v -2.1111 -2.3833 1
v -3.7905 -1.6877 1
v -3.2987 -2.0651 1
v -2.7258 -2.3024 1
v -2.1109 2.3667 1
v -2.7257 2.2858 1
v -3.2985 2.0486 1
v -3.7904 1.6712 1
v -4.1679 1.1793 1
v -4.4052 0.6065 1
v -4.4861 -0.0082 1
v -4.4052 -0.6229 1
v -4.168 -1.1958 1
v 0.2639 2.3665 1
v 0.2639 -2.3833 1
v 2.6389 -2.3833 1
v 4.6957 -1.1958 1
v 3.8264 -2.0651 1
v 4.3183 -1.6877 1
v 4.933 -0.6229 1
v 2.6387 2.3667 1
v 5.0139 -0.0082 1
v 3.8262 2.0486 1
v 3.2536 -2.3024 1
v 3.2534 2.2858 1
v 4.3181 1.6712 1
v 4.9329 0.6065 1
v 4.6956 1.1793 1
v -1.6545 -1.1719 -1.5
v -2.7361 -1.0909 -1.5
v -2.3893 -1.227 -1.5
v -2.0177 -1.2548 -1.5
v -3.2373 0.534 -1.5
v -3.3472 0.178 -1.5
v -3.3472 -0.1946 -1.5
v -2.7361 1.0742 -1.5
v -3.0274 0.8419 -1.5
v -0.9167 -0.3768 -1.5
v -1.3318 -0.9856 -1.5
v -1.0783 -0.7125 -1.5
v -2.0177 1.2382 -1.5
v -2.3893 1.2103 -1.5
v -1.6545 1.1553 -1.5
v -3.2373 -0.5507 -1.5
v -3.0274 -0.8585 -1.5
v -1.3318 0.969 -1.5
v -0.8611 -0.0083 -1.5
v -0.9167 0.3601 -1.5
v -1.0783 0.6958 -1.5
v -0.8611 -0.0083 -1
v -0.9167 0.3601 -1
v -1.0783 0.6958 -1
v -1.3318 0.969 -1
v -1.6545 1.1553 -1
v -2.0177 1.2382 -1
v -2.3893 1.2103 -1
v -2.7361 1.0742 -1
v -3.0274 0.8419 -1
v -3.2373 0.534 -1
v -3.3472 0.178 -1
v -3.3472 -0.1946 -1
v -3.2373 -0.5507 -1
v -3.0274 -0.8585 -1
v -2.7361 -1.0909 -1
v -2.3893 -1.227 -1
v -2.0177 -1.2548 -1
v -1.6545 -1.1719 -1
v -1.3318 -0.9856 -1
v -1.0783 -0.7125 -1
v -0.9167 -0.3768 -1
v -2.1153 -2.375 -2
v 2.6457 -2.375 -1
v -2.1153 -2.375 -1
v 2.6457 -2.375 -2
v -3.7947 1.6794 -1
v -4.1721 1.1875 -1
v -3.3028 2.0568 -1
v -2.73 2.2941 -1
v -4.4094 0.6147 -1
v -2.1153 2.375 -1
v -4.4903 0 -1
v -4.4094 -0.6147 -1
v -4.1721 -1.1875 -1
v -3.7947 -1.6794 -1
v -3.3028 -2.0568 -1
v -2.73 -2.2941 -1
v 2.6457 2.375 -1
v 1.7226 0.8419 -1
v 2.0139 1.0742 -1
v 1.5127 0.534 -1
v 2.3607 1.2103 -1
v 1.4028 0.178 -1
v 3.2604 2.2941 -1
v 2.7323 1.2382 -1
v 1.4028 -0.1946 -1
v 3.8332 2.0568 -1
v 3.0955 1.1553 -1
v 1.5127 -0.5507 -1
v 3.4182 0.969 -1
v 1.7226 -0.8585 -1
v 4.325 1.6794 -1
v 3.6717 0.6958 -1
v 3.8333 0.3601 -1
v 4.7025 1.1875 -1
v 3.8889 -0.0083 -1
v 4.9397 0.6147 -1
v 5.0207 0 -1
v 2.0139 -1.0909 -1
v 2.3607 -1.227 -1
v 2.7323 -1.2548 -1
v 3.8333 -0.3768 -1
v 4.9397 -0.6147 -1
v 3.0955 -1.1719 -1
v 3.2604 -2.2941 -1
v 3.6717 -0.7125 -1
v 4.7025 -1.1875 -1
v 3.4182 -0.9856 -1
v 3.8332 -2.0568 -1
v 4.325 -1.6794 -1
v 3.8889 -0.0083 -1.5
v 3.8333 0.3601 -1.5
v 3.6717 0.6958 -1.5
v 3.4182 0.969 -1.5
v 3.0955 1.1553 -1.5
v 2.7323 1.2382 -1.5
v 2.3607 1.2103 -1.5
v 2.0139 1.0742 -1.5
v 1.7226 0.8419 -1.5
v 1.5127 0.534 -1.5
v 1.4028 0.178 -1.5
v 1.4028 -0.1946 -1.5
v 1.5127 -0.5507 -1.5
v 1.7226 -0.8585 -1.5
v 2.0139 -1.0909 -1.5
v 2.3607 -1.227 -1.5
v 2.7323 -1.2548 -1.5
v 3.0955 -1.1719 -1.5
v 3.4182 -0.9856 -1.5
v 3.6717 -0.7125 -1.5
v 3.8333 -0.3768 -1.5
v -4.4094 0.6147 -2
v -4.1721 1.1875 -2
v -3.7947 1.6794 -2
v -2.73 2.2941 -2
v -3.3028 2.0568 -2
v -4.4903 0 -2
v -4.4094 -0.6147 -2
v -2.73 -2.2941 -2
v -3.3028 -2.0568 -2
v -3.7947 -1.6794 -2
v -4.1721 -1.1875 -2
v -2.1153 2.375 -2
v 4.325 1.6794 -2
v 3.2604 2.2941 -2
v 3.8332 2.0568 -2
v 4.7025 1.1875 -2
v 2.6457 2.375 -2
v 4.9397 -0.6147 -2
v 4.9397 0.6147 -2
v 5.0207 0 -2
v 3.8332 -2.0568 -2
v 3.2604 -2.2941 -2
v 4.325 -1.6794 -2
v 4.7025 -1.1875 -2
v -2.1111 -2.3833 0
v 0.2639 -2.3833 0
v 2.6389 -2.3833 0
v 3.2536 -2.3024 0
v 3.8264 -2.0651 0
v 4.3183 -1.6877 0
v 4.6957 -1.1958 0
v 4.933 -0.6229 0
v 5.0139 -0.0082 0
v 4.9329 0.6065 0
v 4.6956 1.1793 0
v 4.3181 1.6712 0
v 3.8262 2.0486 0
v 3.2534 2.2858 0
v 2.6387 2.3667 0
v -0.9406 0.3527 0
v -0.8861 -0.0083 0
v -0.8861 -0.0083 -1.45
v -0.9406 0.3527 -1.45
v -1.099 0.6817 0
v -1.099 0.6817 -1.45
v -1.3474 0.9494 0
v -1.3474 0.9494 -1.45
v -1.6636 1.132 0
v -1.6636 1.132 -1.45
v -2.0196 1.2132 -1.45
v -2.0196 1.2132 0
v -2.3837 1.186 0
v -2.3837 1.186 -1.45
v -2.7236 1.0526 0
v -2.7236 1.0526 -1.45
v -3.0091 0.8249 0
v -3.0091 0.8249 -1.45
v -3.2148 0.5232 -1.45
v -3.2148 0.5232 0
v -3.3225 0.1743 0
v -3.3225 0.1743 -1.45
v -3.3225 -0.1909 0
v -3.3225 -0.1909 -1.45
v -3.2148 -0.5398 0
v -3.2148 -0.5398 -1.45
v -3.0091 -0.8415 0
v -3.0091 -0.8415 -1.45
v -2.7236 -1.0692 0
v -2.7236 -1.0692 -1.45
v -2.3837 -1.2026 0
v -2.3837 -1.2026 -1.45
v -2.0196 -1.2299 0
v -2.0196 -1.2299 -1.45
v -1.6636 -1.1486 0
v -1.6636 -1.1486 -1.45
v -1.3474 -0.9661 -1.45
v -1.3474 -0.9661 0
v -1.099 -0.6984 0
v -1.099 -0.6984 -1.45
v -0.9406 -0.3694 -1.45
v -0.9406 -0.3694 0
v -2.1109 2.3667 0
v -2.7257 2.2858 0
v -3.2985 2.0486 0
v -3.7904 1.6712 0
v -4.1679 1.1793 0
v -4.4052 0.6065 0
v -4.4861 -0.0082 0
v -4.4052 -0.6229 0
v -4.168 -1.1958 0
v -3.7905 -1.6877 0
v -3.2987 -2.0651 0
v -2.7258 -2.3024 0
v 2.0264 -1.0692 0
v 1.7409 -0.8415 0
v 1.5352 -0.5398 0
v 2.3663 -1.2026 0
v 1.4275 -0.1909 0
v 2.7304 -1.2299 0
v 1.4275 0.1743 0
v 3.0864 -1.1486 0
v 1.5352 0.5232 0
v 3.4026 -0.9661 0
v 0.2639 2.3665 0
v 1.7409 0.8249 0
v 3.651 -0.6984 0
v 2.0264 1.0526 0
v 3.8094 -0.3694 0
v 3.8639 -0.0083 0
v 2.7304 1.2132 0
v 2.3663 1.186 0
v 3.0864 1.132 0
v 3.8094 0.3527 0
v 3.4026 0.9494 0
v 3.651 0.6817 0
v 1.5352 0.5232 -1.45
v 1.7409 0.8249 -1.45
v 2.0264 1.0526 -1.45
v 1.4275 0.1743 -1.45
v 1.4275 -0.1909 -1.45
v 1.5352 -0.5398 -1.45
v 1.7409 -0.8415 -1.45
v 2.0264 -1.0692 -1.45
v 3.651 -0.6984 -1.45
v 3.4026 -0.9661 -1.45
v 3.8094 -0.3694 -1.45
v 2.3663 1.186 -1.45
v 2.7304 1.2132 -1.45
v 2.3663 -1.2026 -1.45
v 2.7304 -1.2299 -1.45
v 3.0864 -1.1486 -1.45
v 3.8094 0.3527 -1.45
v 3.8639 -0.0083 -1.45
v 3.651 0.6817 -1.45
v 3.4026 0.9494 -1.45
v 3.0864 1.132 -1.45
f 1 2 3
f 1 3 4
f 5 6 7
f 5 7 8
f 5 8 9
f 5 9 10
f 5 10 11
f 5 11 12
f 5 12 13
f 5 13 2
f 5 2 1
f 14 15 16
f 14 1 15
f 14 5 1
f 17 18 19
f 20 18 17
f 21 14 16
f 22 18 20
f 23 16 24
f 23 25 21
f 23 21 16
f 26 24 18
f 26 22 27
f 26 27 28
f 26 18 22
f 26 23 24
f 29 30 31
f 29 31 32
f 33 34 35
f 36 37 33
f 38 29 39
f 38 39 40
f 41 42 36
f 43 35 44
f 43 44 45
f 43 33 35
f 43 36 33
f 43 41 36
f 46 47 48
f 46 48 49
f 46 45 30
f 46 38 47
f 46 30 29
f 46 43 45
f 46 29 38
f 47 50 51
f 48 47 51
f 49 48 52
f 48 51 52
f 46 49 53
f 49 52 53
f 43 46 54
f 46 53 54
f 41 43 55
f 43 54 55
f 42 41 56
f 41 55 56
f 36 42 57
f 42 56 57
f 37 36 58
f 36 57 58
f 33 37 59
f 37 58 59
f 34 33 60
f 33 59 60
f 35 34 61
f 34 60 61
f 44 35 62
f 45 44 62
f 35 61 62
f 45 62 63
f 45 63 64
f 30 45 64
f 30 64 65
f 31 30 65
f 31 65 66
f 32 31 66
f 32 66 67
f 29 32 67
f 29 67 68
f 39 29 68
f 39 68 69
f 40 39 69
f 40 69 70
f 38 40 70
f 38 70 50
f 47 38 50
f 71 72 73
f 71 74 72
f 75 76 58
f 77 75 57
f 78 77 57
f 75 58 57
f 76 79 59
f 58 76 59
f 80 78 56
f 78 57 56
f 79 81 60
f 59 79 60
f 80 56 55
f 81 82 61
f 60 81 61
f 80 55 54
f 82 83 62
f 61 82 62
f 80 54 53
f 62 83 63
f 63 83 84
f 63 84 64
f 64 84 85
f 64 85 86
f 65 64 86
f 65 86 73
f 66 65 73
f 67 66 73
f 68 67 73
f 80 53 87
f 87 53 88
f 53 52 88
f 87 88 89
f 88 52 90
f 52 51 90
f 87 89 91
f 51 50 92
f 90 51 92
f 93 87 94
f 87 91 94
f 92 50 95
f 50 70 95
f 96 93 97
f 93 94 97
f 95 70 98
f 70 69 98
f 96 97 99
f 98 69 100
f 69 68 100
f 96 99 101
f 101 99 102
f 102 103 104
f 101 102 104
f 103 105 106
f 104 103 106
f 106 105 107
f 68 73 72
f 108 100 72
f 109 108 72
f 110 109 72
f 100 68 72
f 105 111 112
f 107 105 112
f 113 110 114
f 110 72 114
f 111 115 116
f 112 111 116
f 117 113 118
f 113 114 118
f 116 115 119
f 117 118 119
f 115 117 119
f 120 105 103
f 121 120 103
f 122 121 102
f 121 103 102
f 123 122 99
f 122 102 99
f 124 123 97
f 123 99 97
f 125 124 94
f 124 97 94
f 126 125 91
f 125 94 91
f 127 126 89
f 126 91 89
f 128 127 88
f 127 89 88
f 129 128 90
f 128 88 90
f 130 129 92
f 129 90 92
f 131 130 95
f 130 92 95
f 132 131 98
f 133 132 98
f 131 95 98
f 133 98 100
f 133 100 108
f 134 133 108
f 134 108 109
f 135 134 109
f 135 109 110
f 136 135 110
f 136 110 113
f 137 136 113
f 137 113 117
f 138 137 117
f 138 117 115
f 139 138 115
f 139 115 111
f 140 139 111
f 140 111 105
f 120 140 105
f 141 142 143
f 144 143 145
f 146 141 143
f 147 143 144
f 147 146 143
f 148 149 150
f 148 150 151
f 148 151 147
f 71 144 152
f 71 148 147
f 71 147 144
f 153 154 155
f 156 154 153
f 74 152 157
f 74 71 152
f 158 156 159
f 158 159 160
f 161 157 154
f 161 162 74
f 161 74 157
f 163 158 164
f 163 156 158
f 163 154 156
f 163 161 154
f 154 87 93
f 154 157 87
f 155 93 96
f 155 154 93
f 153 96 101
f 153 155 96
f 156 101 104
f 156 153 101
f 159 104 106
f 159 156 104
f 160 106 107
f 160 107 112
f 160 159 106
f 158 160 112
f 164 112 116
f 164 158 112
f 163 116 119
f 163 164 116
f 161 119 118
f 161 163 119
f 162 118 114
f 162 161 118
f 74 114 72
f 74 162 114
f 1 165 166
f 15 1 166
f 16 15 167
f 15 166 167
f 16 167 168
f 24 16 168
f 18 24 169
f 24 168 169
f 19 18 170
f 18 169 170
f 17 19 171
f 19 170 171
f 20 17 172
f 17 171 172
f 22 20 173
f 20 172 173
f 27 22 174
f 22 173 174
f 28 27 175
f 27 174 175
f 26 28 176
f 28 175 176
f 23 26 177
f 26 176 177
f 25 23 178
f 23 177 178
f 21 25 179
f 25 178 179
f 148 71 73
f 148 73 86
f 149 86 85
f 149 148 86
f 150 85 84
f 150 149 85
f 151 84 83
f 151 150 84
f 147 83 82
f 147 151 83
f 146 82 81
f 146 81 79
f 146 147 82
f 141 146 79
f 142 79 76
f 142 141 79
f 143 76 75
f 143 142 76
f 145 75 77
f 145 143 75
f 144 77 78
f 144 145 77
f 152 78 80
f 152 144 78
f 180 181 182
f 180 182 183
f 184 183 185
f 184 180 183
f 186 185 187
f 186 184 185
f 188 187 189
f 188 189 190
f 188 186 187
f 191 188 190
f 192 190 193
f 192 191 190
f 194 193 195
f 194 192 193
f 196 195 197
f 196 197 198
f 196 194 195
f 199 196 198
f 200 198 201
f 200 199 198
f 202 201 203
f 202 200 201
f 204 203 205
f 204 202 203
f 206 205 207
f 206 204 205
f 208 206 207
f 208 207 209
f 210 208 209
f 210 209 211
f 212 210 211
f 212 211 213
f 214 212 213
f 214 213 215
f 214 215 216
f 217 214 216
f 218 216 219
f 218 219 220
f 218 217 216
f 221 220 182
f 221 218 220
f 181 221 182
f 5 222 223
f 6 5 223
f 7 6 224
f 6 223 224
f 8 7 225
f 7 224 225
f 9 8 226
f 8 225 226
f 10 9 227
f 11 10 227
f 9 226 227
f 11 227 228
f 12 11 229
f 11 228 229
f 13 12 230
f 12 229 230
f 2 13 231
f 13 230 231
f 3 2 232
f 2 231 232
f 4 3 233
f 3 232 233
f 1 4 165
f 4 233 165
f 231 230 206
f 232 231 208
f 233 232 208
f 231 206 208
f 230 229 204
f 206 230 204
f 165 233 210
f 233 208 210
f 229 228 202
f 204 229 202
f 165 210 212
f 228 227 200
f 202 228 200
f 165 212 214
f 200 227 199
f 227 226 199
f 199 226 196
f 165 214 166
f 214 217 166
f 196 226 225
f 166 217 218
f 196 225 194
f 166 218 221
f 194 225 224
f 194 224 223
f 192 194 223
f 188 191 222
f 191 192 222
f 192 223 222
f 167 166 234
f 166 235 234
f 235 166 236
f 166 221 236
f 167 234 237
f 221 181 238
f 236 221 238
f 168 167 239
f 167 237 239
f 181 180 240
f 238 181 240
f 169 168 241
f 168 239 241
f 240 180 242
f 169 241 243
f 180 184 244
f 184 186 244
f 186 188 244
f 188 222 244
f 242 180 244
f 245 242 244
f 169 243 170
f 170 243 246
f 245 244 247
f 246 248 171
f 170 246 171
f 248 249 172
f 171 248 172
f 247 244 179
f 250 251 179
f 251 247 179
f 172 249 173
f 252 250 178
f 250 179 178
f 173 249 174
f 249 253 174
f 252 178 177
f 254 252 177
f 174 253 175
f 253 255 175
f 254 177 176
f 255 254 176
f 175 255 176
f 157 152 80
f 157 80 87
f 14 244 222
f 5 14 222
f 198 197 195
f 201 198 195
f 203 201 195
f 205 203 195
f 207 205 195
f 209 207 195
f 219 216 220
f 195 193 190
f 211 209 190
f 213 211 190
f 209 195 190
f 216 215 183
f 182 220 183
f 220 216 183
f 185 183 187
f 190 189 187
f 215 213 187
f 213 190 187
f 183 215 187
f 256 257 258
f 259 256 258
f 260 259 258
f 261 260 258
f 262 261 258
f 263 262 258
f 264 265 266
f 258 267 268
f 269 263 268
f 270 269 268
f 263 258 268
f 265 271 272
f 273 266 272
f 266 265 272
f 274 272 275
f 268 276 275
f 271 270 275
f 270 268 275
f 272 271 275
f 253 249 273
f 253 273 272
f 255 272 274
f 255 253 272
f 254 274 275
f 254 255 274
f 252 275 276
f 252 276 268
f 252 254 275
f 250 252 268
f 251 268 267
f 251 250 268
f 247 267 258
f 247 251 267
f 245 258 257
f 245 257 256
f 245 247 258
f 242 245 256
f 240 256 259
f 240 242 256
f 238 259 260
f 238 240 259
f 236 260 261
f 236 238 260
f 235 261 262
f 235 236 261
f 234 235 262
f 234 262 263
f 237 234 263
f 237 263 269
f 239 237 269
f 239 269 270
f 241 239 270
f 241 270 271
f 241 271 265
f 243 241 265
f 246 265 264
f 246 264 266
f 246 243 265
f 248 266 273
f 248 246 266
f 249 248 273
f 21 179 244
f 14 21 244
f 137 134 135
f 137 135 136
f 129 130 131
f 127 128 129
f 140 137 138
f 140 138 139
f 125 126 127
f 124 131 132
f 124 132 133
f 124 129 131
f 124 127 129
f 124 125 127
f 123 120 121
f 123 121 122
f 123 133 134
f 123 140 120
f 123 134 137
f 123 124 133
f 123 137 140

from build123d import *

# Parameters (mm, degrees)
F0_R          = 1.25
F0_R_2        = 1.225
F1_DEPTH      = 1
F2_DEPTH      = 1.5
F3_R          = 1.225
F4_DEPTH      = 0.5
F4_DEPTH_BACK = 0.5
F5_DEPTH      = 1.5
F6_DEPTH      = 1.45


with BuildPart() as f1:
    # F0 (on Top) → F1 (new body)
    with BuildSketch(Plane.XY):
        with BuildLine():
            Line((0.2638664927, -2.3833251961), (2.6388664927, -2.3833251961))
            ThreePointArc((2.6388664927, -2.3833251961), (5.0138664949, -0.0082244105), (2.6386649301, 2.3666748038))
            Line((2.6386649301, 2.3666748038), (0.2638664927, 2.3664732583))
            Line((0.2638664927, 2.3664732497), (-2.1109319446, 2.3666747953))
            ThreePointArc((-2.1109319446, 2.3666747953), (-4.4861335051, -0.0082244148), (-2.1111335073, -2.3833251962))
            Line((-2.1111335073, -2.3833251962), (0.2638664927, -2.3833251962))
        make_face()
        with Locations((-2.1111335073, -0.0083251962)):
            Circle(F0_R, mode=Mode.SUBTRACT)
        with Locations((2.6388664927, -0.0083251919)):
            Circle(F0_R, mode=Mode.SUBTRACT)
        with Locations((2.6388664927, -0.0083251919)):
            Circle(F0_R)
        with Locations((2.6388664927, -0.0083251919)):
            Circle(F0_R_2, mode=Mode.SUBTRACT)
        with Locations((-2.1111335073, -0.0083251962)):
            Circle(F0_R)
        with Locations((-2.1111335073, -0.0083251962)):
            Circle(F0_R_2, mode=Mode.SUBTRACT)
        with Locations((-2.1111335073, -0.0083251962)):
            Circle(F0_R_2)
        with Locations((2.6388664927, -0.0083251919)):
            Circle(F0_R_2)
    extrude(amount=F1_DEPTH)

    # F0 (on Top) → F2 (join)
    with BuildSketch(Plane.XY):
        with Locations((2.6388664927, -0.0083251919)):
            Circle(F0_R_2)
        with Locations((-2.1111335073, -0.0083251962)):
            Circle(F0_R_2)
    extrude(amount=-F2_DEPTH)


with BuildPart() as f4:
    # F3 (on face) → F4 (new body, two sides)
    with BuildSketch(Plane(origin=(0, 0, -1.5), x_dir=(1, 0, 0), z_dir=(0, 0, -1))) as f4_sk:
        with BuildLine():
            Line((2.6456569321, 2.375), (-2.1152956275, 2.375))
            ThreePointArc((-2.1152956275, 2.375), (-4.4902956275, 0), (-2.1152956275, -2.375))
            Line((-2.1152956275, -2.375), (2.6456569321, -2.375))
            ThreePointArc((2.6456569321, -2.375), (5.0206569321, 0), (2.6456569321, 2.375))
        make_face()
        with Locations((-2.1111335073, 0.0083251962)):
            Circle(F3_R, mode=Mode.SUBTRACT)
        with Locations((-2.1111335073, 0.0083251962)):
            Circle(F3_R)
    extrude(amount=F4_DEPTH)
    extrude(f4_sk.sketch, amount=-F4_DEPTH_BACK)


with BuildPart() as f5_tool:
    # F0 (on Top) → F5 (new body)
    with BuildSketch(Plane.XY):
        with Locations((2.6388664927, -0.0083251919)):
            Circle(F0_R)
        with Locations((2.6388664927, -0.0083251919)):
            Circle(F0_R_2, mode=Mode.SUBTRACT)
        with Locations((-2.1111335073, -0.0083251962)):
            Circle(F0_R)
        with Locations((-2.1111335073, -0.0083251962)):
            Circle(F0_R_2, mode=Mode.SUBTRACT)
        with Locations((2.6388664927, -0.0083251919)):
            Circle(F0_R_2)
        with Locations((-2.1111335073, -0.0083251962)):
            Circle(F0_R_2)
    extrude(amount=-F5_DEPTH)


with BuildPart() as f1_1:
    add(f1.part)

    # F5: cut by f5_tool
    add(f5_tool.part, mode=Mode.SUBTRACT)

    # F0 (on Top) → F6 (join)
    with BuildSketch(Plane.XY):
        with Locations((2.6388664927, -0.0083251919)):
            Circle(F0_R_2)
        with Locations((-2.1111335073, -0.0083251962)):
            Circle(F0_R_2)
    extrude(amount=-F6_DEPTH)


with BuildPart() as f4_1:
    add(f4.part)

    # F5: cut by f5_tool
    add(f5_tool.part, mode=Mode.SUBTRACT)


solid = Compound([f1_1.part, f4_1.part])
